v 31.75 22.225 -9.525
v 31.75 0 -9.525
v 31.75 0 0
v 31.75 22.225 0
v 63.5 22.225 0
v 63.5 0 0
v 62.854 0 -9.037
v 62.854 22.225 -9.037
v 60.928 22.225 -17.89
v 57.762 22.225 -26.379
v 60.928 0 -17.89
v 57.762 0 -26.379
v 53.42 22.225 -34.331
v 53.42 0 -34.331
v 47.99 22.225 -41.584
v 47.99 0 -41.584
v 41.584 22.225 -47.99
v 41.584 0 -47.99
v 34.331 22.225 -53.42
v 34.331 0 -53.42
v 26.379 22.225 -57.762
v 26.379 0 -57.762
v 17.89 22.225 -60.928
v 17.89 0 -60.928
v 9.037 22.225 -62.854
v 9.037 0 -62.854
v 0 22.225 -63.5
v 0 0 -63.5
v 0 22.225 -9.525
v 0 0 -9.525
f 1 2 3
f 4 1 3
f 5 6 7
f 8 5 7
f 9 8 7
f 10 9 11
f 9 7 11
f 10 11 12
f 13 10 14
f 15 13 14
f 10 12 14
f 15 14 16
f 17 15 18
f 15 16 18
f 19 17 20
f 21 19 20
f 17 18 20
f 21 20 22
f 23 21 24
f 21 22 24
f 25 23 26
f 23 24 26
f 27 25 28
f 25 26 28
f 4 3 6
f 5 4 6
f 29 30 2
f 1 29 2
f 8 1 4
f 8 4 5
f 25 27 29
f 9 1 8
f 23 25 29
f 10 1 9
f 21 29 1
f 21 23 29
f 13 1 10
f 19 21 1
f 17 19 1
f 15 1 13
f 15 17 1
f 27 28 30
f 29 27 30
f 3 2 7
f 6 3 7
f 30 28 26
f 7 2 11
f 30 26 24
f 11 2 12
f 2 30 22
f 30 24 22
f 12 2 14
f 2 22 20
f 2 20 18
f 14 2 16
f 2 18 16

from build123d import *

# Parameters (mm, degrees)
BOSS_EXTRUDE1_DEPTH = 22.225


with BuildPart() as part:
    # Sketch1 → Boss-Extrude1 (new body)
    with BuildSketch(Plane(origin=(0, 0, 0), x_dir=(1, 0, 0), z_dir=(0, 1, 0))):
        with BuildLine():
            Line((0, 63.5), (0, 9.525))
            Line((0, 9.525), (31.75, 9.525))
            Line((31.75, 9.525), (31.75, 0))
            Line((31.75, 0), (63.5, 0))
            ThreePointArc((63.5, 0), (44.901280605, 44.901280605), (0, 63.5))
        make_face()
    extrude(amount=BOSS_EXTRUDE1_DEPTH)


solid = part.part
